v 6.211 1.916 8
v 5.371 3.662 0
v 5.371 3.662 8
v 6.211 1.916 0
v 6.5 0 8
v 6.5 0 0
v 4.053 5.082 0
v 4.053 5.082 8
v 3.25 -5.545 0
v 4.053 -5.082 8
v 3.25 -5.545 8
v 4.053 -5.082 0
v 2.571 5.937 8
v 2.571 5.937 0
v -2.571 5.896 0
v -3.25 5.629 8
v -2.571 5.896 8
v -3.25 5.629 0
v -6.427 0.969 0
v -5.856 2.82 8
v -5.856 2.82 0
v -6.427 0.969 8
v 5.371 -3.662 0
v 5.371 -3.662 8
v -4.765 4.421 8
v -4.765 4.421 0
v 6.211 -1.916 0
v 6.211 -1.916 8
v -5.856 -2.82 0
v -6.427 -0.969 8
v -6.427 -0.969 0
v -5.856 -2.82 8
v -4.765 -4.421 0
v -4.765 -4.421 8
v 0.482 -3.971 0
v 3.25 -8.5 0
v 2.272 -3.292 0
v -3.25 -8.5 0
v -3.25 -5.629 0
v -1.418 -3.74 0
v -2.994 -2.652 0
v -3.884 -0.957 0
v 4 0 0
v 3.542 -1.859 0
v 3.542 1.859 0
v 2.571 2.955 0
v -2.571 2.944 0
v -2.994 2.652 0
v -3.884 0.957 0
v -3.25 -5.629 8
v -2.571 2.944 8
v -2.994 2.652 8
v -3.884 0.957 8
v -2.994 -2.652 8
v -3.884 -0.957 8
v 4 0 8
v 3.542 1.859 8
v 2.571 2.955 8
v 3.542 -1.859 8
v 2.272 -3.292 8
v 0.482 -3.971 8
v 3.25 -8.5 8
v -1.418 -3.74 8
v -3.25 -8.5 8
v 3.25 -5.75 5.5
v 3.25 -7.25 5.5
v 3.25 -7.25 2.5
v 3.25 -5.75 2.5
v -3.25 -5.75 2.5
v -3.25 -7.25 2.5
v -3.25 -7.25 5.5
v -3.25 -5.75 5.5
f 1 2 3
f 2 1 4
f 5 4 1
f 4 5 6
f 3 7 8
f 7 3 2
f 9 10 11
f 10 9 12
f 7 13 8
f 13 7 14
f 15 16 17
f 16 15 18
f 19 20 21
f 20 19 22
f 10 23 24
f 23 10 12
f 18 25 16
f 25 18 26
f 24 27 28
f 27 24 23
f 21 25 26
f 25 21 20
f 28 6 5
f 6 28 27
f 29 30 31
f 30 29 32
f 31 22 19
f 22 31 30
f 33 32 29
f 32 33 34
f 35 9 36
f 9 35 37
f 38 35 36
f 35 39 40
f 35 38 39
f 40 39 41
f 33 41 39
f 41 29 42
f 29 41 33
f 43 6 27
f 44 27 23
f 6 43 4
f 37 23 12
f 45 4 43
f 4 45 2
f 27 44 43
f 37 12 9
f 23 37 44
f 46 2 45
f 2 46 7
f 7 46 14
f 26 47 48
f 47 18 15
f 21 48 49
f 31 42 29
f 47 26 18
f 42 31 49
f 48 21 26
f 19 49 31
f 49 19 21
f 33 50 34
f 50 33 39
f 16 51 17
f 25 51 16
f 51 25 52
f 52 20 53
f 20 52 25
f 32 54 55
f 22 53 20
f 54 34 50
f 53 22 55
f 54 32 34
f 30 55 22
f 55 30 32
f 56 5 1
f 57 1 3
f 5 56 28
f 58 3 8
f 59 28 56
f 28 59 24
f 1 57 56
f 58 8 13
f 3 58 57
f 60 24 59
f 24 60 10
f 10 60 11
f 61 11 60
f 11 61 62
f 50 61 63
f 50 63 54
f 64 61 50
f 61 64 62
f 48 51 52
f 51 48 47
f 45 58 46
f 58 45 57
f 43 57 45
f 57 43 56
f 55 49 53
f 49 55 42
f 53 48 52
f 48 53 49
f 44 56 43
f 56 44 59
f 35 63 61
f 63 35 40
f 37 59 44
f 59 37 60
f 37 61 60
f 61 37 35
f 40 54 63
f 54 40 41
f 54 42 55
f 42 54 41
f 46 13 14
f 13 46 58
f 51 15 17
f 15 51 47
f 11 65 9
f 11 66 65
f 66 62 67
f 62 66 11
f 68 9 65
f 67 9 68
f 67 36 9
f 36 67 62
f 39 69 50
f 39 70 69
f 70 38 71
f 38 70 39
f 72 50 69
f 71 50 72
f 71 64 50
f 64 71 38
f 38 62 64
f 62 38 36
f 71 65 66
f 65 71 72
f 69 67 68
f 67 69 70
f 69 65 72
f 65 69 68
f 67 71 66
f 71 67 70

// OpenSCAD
//-----------------------------------------------------------------
//-  Endstop clamp, derived from the Prusa decorator clamps
//--  (c) Juan Gonzalez Gomez (Obijuan) juan@iearobotics.com, 
//--  April 2013
//-----------------------------------------------------------------

X = 0;
Y = 1;
Z = 2;

//-- Clamp parameters
rod_diam = 8;
clamp_diam = rod_diam + 5;
open_angle = 80;
width = 8;
base_lx = 6.5;
base_ly = 4;
base_lz = width;

zip_tie_holes = [clamp_diam, 1.5, 3];

//-- Internal parameters
open_x = 2*(rod_diam/2)*sin(open_angle/2);

module Prusa_clamp() 
{
  union() {

    //-- Clamp
    difference() {
      //-- outer cylinder
      cylinder(r=clamp_diam/2, h=width);

      //-- Inner cylinder
      cylinder(r=rod_diam/2, h=width+10,center=true);

      //-- Break the ring substracting a cube
      translate([-open_x/2,0,-1])
      cube([open_x, clamp_diam+10, width+2]);
    }

    //-- clamp Base
    translate([0,-clamp_diam/2,base_lz/2])
    cube([base_lx, base_ly, base_lz], center=true);
  }
}


//---  Endstop holder

difference() {

  Prusa_clamp();
  translate([0,
           - clamp_diam/2,
           base_lz/2])
    cube(zip_tie_holes, center=true);
}
